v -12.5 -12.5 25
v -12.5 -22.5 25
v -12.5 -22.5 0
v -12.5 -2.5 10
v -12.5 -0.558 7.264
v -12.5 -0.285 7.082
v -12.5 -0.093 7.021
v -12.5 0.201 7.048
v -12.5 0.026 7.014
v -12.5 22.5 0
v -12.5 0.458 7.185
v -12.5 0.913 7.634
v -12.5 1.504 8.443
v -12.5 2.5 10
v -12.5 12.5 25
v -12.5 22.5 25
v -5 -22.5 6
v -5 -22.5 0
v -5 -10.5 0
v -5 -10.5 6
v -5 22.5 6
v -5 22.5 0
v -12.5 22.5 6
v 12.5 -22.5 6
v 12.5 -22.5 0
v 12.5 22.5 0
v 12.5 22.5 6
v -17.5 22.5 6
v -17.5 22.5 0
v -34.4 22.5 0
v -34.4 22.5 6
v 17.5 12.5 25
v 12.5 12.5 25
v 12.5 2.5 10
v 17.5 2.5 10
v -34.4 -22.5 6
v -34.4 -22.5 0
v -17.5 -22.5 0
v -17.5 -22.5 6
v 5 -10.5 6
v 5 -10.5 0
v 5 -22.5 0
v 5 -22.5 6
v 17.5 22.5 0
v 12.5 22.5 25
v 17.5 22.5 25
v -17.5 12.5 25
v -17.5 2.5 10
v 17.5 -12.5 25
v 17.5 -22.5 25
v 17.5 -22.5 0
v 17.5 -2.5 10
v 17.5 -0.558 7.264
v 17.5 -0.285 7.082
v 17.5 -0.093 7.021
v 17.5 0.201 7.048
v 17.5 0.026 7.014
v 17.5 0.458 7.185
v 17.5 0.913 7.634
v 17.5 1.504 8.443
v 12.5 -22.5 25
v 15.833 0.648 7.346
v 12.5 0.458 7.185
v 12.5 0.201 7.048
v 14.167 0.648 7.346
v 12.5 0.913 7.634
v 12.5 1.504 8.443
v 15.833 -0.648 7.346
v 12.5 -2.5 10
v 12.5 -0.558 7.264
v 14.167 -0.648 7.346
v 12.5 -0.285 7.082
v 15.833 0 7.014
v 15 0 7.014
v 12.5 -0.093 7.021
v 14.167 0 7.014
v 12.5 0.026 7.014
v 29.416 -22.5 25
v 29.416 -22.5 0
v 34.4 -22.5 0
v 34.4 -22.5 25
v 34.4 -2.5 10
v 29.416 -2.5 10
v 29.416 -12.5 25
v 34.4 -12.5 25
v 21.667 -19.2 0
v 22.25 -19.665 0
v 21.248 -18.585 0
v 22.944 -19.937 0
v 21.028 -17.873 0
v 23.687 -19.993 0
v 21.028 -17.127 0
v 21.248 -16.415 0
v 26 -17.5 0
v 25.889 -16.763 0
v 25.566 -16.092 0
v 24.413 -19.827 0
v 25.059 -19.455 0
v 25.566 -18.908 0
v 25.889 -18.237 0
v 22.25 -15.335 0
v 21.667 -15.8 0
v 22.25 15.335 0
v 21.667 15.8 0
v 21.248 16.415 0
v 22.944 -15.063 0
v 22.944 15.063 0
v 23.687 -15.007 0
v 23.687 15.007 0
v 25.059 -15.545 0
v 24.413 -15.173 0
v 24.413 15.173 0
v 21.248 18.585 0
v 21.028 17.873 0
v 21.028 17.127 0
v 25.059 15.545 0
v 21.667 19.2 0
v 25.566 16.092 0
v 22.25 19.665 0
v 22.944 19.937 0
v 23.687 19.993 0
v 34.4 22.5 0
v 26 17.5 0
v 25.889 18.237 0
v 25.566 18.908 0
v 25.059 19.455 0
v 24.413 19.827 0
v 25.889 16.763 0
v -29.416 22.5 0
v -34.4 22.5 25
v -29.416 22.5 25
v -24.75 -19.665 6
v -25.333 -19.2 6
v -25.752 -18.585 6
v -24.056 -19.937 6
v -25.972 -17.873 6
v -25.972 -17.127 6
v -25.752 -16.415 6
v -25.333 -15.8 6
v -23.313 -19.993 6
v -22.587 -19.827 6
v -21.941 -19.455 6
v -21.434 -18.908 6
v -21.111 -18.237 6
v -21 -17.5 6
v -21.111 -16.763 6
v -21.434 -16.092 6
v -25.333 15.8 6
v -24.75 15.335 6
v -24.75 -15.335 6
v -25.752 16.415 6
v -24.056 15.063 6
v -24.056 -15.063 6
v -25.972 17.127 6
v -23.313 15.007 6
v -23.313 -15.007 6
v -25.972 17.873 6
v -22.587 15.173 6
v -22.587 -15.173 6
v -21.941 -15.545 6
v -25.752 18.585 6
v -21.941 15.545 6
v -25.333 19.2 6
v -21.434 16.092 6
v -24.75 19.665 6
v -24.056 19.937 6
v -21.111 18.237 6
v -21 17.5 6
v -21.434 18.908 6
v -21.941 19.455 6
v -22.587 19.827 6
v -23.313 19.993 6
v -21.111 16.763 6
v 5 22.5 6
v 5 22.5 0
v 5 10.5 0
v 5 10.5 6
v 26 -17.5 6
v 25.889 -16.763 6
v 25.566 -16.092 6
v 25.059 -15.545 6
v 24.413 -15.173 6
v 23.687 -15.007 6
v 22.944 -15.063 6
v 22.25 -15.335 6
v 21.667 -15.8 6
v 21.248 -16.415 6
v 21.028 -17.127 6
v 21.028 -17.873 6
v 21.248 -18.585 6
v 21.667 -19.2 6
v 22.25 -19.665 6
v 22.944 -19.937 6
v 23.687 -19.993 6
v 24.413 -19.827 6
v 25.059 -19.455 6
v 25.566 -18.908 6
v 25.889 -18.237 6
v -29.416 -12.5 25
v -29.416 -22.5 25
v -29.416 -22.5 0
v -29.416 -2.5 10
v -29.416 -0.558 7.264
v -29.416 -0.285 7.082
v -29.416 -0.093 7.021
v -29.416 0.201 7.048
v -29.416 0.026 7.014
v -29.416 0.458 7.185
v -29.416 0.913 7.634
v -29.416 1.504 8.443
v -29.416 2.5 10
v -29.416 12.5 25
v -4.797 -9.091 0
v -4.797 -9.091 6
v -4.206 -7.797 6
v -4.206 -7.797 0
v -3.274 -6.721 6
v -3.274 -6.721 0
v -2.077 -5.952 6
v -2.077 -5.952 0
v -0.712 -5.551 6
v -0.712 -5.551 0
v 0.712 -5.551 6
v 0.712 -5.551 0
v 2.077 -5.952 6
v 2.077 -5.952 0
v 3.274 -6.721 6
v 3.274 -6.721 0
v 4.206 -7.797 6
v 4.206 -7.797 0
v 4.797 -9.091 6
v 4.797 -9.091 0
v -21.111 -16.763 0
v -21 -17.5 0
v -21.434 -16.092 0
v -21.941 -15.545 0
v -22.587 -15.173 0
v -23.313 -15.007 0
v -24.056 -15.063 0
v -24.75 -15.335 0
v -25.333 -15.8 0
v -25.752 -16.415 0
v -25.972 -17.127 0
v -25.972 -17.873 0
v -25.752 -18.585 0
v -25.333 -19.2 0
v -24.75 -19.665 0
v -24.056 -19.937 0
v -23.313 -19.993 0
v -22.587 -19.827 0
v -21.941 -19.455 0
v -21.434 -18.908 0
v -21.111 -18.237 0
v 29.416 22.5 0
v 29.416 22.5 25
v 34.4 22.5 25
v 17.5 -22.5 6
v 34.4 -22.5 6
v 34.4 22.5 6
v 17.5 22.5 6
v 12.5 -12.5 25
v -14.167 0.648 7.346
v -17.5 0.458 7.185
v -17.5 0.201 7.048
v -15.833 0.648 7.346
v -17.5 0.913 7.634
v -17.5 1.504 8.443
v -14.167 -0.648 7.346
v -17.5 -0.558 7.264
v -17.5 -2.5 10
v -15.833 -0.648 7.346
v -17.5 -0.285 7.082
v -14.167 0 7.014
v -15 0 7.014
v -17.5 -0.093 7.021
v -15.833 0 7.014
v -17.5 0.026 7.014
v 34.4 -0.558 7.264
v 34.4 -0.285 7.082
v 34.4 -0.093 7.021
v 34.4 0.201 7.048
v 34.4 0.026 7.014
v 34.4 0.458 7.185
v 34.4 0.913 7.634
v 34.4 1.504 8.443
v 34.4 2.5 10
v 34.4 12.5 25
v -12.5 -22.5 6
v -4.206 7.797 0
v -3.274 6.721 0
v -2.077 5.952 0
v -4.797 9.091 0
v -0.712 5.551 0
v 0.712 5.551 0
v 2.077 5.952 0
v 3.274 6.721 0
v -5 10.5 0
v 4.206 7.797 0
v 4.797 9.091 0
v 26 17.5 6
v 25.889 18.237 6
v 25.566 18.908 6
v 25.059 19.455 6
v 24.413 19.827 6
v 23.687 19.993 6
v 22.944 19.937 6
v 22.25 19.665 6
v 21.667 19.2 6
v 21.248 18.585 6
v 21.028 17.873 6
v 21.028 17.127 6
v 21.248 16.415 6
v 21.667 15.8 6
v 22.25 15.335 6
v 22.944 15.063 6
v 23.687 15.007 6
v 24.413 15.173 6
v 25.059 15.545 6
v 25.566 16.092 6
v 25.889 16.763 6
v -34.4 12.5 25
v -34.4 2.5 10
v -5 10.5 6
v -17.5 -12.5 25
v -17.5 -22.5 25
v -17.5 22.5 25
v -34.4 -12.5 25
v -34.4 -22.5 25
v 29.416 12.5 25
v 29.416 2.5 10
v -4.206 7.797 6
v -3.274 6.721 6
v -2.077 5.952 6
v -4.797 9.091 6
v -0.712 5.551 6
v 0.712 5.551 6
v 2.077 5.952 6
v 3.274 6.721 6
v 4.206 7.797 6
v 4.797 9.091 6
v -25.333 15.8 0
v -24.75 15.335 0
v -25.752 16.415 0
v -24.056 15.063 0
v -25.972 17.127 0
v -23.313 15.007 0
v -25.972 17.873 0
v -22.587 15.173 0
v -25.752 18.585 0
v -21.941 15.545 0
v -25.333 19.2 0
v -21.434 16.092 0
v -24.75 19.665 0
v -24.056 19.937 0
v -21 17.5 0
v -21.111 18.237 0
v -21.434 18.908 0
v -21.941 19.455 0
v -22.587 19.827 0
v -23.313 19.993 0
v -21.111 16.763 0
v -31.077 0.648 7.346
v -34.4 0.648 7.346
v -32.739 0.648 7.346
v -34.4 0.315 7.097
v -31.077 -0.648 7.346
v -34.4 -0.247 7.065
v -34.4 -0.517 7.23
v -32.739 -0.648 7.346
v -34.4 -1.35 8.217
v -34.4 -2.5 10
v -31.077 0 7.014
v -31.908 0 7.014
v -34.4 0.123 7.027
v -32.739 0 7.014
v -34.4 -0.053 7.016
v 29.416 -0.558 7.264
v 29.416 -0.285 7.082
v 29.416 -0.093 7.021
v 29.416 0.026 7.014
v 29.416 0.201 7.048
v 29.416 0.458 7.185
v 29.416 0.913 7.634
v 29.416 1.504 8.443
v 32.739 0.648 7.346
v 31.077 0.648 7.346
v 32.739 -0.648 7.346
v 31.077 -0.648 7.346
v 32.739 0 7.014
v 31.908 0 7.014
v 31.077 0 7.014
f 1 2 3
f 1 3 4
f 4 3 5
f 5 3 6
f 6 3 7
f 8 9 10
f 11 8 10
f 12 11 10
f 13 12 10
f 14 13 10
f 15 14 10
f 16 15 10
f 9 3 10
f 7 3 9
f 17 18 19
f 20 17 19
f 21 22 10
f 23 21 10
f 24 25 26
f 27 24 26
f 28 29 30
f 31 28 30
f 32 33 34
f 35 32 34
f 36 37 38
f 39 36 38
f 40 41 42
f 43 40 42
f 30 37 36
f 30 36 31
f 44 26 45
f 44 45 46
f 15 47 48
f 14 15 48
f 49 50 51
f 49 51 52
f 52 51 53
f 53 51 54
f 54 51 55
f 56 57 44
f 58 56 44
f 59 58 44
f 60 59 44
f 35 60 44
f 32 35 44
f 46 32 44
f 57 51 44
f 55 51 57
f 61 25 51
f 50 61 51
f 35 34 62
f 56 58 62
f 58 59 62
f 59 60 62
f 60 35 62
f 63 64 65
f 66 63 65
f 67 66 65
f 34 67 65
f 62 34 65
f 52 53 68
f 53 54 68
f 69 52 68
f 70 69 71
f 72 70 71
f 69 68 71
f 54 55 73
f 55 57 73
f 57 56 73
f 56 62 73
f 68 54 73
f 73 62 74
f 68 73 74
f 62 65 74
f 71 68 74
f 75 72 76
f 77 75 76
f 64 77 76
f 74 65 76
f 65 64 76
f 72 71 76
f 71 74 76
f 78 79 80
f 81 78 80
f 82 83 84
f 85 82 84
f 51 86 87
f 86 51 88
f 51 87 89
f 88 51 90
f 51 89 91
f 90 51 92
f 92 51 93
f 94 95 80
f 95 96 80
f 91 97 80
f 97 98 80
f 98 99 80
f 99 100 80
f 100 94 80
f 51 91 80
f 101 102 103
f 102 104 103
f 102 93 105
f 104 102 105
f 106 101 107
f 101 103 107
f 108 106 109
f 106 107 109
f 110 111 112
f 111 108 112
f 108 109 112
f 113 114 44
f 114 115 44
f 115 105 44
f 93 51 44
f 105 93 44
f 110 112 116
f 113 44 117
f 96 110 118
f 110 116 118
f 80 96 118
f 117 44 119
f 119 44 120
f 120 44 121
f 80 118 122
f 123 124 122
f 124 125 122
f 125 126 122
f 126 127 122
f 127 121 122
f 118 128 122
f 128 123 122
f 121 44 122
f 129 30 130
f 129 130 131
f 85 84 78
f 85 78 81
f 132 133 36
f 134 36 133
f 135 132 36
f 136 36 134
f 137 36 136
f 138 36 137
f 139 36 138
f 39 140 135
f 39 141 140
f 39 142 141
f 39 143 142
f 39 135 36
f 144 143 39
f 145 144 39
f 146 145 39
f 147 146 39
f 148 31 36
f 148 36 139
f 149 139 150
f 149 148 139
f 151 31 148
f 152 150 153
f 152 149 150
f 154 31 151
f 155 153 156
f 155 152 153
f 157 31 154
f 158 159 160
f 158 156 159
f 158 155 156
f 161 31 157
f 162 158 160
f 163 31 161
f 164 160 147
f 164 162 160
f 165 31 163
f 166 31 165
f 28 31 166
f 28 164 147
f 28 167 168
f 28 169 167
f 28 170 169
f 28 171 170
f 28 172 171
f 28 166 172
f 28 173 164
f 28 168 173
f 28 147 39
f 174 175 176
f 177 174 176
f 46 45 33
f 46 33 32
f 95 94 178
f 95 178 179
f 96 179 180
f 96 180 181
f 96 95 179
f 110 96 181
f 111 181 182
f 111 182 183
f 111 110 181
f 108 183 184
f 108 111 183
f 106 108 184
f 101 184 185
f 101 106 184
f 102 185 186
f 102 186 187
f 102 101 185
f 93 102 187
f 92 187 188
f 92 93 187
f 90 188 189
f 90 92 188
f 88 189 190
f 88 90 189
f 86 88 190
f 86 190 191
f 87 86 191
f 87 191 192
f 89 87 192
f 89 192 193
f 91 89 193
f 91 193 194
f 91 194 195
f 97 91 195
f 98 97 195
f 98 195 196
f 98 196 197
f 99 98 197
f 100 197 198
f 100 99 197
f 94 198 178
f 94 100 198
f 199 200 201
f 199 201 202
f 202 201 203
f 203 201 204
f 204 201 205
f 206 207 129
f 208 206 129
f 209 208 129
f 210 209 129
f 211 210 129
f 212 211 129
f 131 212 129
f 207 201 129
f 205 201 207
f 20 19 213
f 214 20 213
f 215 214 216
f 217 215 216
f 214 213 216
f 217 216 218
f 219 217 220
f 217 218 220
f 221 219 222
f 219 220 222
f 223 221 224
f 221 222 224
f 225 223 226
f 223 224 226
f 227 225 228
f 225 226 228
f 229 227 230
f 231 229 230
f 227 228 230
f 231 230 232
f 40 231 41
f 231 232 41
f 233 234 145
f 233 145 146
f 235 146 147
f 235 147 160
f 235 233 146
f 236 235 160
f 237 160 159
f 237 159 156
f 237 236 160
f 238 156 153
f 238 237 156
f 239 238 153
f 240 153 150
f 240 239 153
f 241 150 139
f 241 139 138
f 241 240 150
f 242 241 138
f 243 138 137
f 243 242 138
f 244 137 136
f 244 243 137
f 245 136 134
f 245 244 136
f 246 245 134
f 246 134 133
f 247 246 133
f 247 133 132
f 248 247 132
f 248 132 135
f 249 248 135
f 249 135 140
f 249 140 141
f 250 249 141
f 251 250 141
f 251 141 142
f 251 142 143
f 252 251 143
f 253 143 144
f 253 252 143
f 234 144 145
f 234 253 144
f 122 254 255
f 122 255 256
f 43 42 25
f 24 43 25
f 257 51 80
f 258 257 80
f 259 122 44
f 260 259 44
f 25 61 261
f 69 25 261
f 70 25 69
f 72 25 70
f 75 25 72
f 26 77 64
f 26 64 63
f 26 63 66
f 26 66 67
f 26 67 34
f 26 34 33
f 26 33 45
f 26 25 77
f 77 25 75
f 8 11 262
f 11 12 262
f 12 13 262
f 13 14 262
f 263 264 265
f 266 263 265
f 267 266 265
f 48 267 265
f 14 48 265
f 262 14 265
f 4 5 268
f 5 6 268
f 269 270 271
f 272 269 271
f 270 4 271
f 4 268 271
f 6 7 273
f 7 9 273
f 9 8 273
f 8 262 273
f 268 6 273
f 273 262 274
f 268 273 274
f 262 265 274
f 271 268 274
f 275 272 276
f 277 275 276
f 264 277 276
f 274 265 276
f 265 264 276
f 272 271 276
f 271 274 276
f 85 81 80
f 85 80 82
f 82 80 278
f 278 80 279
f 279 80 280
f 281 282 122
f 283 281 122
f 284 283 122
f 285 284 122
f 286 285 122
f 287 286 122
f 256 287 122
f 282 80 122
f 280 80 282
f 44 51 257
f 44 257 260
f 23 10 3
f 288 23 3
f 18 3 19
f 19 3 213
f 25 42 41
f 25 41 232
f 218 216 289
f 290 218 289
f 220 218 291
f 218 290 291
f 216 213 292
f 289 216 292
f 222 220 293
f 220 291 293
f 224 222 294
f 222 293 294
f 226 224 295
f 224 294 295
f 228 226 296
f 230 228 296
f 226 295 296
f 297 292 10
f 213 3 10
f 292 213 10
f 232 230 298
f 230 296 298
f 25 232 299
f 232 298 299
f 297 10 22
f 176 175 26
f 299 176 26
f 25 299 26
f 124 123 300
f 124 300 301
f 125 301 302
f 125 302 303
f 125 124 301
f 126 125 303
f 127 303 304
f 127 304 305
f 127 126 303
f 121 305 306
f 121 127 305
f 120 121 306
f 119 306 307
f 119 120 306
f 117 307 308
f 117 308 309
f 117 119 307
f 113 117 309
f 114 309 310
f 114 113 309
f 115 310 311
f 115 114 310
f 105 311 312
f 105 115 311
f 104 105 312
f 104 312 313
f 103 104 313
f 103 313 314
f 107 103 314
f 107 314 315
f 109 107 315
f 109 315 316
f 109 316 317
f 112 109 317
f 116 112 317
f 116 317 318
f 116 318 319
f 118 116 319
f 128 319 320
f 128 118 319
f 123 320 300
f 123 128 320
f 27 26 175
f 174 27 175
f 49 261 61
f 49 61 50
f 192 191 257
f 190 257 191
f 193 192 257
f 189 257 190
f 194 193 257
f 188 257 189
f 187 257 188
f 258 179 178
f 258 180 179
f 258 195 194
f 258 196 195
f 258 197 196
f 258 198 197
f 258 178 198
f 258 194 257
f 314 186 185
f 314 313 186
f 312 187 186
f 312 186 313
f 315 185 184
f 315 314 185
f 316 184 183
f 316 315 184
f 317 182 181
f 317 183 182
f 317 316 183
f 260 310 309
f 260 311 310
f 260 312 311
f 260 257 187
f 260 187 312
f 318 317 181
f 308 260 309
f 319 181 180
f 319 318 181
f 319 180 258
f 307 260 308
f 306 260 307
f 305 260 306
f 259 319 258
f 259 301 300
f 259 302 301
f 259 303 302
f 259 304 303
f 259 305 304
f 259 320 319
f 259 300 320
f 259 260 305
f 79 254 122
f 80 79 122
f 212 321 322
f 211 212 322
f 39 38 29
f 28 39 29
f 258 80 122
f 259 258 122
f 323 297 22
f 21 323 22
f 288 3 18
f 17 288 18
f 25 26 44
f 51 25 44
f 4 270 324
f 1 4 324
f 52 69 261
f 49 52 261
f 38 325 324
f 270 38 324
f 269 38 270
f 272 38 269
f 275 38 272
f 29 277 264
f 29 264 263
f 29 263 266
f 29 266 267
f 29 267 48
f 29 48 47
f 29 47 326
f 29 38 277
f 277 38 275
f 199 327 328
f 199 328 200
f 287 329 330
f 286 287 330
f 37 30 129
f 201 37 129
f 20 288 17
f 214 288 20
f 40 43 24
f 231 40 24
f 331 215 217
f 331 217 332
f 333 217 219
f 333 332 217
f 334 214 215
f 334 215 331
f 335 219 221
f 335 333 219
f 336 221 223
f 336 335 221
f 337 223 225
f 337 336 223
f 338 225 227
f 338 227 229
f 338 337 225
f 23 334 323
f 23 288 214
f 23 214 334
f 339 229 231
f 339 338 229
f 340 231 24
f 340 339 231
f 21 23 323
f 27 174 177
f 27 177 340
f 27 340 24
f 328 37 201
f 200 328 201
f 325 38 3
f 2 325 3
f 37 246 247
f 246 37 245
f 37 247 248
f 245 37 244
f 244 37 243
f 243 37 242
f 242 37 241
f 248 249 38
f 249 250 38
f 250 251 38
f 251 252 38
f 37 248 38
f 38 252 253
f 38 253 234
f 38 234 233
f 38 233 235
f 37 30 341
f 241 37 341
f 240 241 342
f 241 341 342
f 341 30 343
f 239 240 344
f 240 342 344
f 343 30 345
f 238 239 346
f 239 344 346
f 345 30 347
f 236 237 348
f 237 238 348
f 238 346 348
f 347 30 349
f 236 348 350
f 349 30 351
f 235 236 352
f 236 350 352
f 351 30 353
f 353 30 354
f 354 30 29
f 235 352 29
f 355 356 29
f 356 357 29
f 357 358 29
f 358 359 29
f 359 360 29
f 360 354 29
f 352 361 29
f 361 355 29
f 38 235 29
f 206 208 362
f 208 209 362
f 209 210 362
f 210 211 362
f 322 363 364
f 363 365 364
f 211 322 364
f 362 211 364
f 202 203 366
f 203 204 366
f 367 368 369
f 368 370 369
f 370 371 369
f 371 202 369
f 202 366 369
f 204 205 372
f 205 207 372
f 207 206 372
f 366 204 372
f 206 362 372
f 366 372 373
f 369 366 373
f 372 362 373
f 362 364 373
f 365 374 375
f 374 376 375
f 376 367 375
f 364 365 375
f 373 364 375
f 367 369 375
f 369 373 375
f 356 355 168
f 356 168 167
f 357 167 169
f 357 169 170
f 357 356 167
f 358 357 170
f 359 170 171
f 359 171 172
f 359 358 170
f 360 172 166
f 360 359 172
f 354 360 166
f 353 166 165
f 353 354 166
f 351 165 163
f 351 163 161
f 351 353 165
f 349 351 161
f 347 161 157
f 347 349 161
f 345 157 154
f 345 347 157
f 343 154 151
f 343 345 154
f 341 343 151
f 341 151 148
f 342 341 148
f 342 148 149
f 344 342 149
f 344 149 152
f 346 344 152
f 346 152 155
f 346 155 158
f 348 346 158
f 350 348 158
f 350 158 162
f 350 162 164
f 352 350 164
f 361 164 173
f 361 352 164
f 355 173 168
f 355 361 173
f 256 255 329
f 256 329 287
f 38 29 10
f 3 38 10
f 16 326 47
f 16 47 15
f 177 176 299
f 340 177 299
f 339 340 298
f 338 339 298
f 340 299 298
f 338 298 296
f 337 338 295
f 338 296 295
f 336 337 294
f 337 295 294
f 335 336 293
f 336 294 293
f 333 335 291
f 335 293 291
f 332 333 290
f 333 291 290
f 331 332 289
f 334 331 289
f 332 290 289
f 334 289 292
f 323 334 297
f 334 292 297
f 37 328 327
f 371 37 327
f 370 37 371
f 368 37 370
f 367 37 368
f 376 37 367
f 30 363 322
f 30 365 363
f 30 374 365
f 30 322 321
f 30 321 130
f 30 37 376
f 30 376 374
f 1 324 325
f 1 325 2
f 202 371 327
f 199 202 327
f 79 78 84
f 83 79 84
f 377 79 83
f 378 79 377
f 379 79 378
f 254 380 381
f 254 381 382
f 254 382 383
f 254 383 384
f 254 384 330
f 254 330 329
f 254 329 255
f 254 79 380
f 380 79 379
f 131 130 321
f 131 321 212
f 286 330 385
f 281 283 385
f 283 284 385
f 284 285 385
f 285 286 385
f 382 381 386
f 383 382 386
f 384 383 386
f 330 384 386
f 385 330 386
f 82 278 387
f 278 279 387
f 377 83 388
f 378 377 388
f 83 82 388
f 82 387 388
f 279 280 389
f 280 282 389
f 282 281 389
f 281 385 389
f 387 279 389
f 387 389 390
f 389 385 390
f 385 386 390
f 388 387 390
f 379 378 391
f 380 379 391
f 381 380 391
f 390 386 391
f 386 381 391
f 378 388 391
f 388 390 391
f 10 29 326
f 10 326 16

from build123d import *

# Parameters (mm, degrees)
F0_W     = 4.9838690698
F0_H     = 45
F0_W_2   = 11.9161309302
F0_R     = 2.5
F1_DEPTH = 6
F2_DEPTH = 25
F0_W_3   = 5
F4_DEPTH = 68.801


with BuildPart() as f1:
    # F0 (on Top) → F1 (new body)
    with BuildSketch(Plane.XY):
        with Locations((-31.9080654651, 0)):
            Rectangle(F0_W, F0_H)
        with Locations((-23.4580654651, 0)):
            Rectangle(F0_W_2, F0_H)
        with Locations((-23.5, -17.5)):
            Circle(F0_R, mode=Mode.SUBTRACT)
        with Locations((-23.5, 17.5)):
            Circle(F0_R, mode=Mode.SUBTRACT)
    extrude(amount=F1_DEPTH)


with BuildPart() as f1b:
    # F0 (on Top) → F1, piece 2 (new body)
    with BuildSketch(Plane.XY):
        with BuildLine():
            Line((5, -22.5), (12.5, -22.5))
            Line((12.5, -22.5), (12.5, 22.5))
            Line((12.5, 22.5), (5, 22.5))
            Line((5, 22.5), (5, 10.5))
            ThreePointArc((5, 10.5), (0, 5.5), (-5, 10.5))
            Line((-5, 10.5), (-5, 22.5))
            Line((-5, 22.5), (-12.5, 22.5))
            Line((-12.5, 22.5), (-12.5, -22.5))
            Line((-12.5, -22.5), (-5, -22.5))
            Line((-5, -22.5), (-5, -10.5))
            ThreePointArc((-5, -10.5), (0, -5.5), (5, -10.5))
            Line((5, -10.5), (5, -22.5))
        make_face()
    extrude(amount=F1_DEPTH)


with BuildPart() as f1c:
    # F0 (on Top) → F1, piece 3 (new body)
    with BuildSketch(Plane.XY):
        with Locations((23.4580654651, 0)):
            Rectangle(F0_W_2, F0_H)
        with Locations((23.5, -17.5)):
            Circle(F0_R, mode=Mode.SUBTRACT)
        with Locations((23.5, 17.5)):
            Circle(F0_R, mode=Mode.SUBTRACT)
        with Locations((31.9080654651, 0)):
            Rectangle(F0_W, F0_H)
    extrude(amount=F1_DEPTH)


with BuildPart() as f2:
    # F0 (on Top) → F2 (new body)
    with BuildSketch(Plane.XY):
        with Locations((-31.9080654651, 0)):
            Rectangle(F0_W, F0_H)
    extrude(amount=F2_DEPTH)


with BuildPart() as f2b:
    # F0 (on Top) → F2, piece 2 (new body)
    with BuildSketch(Plane.XY):
        with Locations((-15, 0)):
            Rectangle(F0_W_3, F0_H)
    extrude(amount=F2_DEPTH)


with BuildPart() as f2c:
    # F0 (on Top) → F2, piece 3 (new body)
    with BuildSketch(Plane.XY):
        with Locations((15, 0)):
            Rectangle(F0_W_3, F0_H)
    extrude(amount=F2_DEPTH)


with BuildPart() as f2d:
    # F0 (on Top) → F2, piece 4 (new body)
    with BuildSketch(Plane.XY):
        with Locations((31.9080654651, 0)):
            Rectangle(F0_W, F0_H)
    extrude(amount=F2_DEPTH)


with BuildPart() as f4_tool:
    # F3 (on face) → F4 (new body, through all)
    with BuildSketch(Plane(origin=(-34.4, 0, 0), x_dir=(0, -1, 0), z_dir=(-1, 0, 0))):
        with BuildLine():
            add(Edge.make_bspline(
                [(-2.5, 10), (0, 6.01850776), (0, 6.01850776), (2.5, 10)],
                knots=[0, 0, 0, 0, 5, 5, 5, 5], degree=3))
            Line((2.5, 10), (12.5, 25))
            Line((12.5, 25), (-12.5, 25))
            Line((-12.5, 25), (-2.5, 10))
        make_face()
    extrude(amount=-F4_DEPTH)


with BuildPart() as f2_1:
    add(f2.part)

    # F4: cut by f4_tool
    add(f4_tool.part, mode=Mode.SUBTRACT)


with BuildPart() as f2b_1:
    add(f2b.part)

    # F4: cut by f4_tool
    add(f4_tool.part, mode=Mode.SUBTRACT)


with BuildPart() as f2c_1:
    add(f2c.part)

    # F4: cut by f4_tool
    add(f4_tool.part, mode=Mode.SUBTRACT)


with BuildPart() as f2d_1:
    add(f2d.part)

    # F4: cut by f4_tool
    add(f4_tool.part, mode=Mode.SUBTRACT)


solid = Compound([f1.part, f1b.part, f1c.part, f2_1.part, f2b_1.part, f2c_1.part, f2d_1.part])
